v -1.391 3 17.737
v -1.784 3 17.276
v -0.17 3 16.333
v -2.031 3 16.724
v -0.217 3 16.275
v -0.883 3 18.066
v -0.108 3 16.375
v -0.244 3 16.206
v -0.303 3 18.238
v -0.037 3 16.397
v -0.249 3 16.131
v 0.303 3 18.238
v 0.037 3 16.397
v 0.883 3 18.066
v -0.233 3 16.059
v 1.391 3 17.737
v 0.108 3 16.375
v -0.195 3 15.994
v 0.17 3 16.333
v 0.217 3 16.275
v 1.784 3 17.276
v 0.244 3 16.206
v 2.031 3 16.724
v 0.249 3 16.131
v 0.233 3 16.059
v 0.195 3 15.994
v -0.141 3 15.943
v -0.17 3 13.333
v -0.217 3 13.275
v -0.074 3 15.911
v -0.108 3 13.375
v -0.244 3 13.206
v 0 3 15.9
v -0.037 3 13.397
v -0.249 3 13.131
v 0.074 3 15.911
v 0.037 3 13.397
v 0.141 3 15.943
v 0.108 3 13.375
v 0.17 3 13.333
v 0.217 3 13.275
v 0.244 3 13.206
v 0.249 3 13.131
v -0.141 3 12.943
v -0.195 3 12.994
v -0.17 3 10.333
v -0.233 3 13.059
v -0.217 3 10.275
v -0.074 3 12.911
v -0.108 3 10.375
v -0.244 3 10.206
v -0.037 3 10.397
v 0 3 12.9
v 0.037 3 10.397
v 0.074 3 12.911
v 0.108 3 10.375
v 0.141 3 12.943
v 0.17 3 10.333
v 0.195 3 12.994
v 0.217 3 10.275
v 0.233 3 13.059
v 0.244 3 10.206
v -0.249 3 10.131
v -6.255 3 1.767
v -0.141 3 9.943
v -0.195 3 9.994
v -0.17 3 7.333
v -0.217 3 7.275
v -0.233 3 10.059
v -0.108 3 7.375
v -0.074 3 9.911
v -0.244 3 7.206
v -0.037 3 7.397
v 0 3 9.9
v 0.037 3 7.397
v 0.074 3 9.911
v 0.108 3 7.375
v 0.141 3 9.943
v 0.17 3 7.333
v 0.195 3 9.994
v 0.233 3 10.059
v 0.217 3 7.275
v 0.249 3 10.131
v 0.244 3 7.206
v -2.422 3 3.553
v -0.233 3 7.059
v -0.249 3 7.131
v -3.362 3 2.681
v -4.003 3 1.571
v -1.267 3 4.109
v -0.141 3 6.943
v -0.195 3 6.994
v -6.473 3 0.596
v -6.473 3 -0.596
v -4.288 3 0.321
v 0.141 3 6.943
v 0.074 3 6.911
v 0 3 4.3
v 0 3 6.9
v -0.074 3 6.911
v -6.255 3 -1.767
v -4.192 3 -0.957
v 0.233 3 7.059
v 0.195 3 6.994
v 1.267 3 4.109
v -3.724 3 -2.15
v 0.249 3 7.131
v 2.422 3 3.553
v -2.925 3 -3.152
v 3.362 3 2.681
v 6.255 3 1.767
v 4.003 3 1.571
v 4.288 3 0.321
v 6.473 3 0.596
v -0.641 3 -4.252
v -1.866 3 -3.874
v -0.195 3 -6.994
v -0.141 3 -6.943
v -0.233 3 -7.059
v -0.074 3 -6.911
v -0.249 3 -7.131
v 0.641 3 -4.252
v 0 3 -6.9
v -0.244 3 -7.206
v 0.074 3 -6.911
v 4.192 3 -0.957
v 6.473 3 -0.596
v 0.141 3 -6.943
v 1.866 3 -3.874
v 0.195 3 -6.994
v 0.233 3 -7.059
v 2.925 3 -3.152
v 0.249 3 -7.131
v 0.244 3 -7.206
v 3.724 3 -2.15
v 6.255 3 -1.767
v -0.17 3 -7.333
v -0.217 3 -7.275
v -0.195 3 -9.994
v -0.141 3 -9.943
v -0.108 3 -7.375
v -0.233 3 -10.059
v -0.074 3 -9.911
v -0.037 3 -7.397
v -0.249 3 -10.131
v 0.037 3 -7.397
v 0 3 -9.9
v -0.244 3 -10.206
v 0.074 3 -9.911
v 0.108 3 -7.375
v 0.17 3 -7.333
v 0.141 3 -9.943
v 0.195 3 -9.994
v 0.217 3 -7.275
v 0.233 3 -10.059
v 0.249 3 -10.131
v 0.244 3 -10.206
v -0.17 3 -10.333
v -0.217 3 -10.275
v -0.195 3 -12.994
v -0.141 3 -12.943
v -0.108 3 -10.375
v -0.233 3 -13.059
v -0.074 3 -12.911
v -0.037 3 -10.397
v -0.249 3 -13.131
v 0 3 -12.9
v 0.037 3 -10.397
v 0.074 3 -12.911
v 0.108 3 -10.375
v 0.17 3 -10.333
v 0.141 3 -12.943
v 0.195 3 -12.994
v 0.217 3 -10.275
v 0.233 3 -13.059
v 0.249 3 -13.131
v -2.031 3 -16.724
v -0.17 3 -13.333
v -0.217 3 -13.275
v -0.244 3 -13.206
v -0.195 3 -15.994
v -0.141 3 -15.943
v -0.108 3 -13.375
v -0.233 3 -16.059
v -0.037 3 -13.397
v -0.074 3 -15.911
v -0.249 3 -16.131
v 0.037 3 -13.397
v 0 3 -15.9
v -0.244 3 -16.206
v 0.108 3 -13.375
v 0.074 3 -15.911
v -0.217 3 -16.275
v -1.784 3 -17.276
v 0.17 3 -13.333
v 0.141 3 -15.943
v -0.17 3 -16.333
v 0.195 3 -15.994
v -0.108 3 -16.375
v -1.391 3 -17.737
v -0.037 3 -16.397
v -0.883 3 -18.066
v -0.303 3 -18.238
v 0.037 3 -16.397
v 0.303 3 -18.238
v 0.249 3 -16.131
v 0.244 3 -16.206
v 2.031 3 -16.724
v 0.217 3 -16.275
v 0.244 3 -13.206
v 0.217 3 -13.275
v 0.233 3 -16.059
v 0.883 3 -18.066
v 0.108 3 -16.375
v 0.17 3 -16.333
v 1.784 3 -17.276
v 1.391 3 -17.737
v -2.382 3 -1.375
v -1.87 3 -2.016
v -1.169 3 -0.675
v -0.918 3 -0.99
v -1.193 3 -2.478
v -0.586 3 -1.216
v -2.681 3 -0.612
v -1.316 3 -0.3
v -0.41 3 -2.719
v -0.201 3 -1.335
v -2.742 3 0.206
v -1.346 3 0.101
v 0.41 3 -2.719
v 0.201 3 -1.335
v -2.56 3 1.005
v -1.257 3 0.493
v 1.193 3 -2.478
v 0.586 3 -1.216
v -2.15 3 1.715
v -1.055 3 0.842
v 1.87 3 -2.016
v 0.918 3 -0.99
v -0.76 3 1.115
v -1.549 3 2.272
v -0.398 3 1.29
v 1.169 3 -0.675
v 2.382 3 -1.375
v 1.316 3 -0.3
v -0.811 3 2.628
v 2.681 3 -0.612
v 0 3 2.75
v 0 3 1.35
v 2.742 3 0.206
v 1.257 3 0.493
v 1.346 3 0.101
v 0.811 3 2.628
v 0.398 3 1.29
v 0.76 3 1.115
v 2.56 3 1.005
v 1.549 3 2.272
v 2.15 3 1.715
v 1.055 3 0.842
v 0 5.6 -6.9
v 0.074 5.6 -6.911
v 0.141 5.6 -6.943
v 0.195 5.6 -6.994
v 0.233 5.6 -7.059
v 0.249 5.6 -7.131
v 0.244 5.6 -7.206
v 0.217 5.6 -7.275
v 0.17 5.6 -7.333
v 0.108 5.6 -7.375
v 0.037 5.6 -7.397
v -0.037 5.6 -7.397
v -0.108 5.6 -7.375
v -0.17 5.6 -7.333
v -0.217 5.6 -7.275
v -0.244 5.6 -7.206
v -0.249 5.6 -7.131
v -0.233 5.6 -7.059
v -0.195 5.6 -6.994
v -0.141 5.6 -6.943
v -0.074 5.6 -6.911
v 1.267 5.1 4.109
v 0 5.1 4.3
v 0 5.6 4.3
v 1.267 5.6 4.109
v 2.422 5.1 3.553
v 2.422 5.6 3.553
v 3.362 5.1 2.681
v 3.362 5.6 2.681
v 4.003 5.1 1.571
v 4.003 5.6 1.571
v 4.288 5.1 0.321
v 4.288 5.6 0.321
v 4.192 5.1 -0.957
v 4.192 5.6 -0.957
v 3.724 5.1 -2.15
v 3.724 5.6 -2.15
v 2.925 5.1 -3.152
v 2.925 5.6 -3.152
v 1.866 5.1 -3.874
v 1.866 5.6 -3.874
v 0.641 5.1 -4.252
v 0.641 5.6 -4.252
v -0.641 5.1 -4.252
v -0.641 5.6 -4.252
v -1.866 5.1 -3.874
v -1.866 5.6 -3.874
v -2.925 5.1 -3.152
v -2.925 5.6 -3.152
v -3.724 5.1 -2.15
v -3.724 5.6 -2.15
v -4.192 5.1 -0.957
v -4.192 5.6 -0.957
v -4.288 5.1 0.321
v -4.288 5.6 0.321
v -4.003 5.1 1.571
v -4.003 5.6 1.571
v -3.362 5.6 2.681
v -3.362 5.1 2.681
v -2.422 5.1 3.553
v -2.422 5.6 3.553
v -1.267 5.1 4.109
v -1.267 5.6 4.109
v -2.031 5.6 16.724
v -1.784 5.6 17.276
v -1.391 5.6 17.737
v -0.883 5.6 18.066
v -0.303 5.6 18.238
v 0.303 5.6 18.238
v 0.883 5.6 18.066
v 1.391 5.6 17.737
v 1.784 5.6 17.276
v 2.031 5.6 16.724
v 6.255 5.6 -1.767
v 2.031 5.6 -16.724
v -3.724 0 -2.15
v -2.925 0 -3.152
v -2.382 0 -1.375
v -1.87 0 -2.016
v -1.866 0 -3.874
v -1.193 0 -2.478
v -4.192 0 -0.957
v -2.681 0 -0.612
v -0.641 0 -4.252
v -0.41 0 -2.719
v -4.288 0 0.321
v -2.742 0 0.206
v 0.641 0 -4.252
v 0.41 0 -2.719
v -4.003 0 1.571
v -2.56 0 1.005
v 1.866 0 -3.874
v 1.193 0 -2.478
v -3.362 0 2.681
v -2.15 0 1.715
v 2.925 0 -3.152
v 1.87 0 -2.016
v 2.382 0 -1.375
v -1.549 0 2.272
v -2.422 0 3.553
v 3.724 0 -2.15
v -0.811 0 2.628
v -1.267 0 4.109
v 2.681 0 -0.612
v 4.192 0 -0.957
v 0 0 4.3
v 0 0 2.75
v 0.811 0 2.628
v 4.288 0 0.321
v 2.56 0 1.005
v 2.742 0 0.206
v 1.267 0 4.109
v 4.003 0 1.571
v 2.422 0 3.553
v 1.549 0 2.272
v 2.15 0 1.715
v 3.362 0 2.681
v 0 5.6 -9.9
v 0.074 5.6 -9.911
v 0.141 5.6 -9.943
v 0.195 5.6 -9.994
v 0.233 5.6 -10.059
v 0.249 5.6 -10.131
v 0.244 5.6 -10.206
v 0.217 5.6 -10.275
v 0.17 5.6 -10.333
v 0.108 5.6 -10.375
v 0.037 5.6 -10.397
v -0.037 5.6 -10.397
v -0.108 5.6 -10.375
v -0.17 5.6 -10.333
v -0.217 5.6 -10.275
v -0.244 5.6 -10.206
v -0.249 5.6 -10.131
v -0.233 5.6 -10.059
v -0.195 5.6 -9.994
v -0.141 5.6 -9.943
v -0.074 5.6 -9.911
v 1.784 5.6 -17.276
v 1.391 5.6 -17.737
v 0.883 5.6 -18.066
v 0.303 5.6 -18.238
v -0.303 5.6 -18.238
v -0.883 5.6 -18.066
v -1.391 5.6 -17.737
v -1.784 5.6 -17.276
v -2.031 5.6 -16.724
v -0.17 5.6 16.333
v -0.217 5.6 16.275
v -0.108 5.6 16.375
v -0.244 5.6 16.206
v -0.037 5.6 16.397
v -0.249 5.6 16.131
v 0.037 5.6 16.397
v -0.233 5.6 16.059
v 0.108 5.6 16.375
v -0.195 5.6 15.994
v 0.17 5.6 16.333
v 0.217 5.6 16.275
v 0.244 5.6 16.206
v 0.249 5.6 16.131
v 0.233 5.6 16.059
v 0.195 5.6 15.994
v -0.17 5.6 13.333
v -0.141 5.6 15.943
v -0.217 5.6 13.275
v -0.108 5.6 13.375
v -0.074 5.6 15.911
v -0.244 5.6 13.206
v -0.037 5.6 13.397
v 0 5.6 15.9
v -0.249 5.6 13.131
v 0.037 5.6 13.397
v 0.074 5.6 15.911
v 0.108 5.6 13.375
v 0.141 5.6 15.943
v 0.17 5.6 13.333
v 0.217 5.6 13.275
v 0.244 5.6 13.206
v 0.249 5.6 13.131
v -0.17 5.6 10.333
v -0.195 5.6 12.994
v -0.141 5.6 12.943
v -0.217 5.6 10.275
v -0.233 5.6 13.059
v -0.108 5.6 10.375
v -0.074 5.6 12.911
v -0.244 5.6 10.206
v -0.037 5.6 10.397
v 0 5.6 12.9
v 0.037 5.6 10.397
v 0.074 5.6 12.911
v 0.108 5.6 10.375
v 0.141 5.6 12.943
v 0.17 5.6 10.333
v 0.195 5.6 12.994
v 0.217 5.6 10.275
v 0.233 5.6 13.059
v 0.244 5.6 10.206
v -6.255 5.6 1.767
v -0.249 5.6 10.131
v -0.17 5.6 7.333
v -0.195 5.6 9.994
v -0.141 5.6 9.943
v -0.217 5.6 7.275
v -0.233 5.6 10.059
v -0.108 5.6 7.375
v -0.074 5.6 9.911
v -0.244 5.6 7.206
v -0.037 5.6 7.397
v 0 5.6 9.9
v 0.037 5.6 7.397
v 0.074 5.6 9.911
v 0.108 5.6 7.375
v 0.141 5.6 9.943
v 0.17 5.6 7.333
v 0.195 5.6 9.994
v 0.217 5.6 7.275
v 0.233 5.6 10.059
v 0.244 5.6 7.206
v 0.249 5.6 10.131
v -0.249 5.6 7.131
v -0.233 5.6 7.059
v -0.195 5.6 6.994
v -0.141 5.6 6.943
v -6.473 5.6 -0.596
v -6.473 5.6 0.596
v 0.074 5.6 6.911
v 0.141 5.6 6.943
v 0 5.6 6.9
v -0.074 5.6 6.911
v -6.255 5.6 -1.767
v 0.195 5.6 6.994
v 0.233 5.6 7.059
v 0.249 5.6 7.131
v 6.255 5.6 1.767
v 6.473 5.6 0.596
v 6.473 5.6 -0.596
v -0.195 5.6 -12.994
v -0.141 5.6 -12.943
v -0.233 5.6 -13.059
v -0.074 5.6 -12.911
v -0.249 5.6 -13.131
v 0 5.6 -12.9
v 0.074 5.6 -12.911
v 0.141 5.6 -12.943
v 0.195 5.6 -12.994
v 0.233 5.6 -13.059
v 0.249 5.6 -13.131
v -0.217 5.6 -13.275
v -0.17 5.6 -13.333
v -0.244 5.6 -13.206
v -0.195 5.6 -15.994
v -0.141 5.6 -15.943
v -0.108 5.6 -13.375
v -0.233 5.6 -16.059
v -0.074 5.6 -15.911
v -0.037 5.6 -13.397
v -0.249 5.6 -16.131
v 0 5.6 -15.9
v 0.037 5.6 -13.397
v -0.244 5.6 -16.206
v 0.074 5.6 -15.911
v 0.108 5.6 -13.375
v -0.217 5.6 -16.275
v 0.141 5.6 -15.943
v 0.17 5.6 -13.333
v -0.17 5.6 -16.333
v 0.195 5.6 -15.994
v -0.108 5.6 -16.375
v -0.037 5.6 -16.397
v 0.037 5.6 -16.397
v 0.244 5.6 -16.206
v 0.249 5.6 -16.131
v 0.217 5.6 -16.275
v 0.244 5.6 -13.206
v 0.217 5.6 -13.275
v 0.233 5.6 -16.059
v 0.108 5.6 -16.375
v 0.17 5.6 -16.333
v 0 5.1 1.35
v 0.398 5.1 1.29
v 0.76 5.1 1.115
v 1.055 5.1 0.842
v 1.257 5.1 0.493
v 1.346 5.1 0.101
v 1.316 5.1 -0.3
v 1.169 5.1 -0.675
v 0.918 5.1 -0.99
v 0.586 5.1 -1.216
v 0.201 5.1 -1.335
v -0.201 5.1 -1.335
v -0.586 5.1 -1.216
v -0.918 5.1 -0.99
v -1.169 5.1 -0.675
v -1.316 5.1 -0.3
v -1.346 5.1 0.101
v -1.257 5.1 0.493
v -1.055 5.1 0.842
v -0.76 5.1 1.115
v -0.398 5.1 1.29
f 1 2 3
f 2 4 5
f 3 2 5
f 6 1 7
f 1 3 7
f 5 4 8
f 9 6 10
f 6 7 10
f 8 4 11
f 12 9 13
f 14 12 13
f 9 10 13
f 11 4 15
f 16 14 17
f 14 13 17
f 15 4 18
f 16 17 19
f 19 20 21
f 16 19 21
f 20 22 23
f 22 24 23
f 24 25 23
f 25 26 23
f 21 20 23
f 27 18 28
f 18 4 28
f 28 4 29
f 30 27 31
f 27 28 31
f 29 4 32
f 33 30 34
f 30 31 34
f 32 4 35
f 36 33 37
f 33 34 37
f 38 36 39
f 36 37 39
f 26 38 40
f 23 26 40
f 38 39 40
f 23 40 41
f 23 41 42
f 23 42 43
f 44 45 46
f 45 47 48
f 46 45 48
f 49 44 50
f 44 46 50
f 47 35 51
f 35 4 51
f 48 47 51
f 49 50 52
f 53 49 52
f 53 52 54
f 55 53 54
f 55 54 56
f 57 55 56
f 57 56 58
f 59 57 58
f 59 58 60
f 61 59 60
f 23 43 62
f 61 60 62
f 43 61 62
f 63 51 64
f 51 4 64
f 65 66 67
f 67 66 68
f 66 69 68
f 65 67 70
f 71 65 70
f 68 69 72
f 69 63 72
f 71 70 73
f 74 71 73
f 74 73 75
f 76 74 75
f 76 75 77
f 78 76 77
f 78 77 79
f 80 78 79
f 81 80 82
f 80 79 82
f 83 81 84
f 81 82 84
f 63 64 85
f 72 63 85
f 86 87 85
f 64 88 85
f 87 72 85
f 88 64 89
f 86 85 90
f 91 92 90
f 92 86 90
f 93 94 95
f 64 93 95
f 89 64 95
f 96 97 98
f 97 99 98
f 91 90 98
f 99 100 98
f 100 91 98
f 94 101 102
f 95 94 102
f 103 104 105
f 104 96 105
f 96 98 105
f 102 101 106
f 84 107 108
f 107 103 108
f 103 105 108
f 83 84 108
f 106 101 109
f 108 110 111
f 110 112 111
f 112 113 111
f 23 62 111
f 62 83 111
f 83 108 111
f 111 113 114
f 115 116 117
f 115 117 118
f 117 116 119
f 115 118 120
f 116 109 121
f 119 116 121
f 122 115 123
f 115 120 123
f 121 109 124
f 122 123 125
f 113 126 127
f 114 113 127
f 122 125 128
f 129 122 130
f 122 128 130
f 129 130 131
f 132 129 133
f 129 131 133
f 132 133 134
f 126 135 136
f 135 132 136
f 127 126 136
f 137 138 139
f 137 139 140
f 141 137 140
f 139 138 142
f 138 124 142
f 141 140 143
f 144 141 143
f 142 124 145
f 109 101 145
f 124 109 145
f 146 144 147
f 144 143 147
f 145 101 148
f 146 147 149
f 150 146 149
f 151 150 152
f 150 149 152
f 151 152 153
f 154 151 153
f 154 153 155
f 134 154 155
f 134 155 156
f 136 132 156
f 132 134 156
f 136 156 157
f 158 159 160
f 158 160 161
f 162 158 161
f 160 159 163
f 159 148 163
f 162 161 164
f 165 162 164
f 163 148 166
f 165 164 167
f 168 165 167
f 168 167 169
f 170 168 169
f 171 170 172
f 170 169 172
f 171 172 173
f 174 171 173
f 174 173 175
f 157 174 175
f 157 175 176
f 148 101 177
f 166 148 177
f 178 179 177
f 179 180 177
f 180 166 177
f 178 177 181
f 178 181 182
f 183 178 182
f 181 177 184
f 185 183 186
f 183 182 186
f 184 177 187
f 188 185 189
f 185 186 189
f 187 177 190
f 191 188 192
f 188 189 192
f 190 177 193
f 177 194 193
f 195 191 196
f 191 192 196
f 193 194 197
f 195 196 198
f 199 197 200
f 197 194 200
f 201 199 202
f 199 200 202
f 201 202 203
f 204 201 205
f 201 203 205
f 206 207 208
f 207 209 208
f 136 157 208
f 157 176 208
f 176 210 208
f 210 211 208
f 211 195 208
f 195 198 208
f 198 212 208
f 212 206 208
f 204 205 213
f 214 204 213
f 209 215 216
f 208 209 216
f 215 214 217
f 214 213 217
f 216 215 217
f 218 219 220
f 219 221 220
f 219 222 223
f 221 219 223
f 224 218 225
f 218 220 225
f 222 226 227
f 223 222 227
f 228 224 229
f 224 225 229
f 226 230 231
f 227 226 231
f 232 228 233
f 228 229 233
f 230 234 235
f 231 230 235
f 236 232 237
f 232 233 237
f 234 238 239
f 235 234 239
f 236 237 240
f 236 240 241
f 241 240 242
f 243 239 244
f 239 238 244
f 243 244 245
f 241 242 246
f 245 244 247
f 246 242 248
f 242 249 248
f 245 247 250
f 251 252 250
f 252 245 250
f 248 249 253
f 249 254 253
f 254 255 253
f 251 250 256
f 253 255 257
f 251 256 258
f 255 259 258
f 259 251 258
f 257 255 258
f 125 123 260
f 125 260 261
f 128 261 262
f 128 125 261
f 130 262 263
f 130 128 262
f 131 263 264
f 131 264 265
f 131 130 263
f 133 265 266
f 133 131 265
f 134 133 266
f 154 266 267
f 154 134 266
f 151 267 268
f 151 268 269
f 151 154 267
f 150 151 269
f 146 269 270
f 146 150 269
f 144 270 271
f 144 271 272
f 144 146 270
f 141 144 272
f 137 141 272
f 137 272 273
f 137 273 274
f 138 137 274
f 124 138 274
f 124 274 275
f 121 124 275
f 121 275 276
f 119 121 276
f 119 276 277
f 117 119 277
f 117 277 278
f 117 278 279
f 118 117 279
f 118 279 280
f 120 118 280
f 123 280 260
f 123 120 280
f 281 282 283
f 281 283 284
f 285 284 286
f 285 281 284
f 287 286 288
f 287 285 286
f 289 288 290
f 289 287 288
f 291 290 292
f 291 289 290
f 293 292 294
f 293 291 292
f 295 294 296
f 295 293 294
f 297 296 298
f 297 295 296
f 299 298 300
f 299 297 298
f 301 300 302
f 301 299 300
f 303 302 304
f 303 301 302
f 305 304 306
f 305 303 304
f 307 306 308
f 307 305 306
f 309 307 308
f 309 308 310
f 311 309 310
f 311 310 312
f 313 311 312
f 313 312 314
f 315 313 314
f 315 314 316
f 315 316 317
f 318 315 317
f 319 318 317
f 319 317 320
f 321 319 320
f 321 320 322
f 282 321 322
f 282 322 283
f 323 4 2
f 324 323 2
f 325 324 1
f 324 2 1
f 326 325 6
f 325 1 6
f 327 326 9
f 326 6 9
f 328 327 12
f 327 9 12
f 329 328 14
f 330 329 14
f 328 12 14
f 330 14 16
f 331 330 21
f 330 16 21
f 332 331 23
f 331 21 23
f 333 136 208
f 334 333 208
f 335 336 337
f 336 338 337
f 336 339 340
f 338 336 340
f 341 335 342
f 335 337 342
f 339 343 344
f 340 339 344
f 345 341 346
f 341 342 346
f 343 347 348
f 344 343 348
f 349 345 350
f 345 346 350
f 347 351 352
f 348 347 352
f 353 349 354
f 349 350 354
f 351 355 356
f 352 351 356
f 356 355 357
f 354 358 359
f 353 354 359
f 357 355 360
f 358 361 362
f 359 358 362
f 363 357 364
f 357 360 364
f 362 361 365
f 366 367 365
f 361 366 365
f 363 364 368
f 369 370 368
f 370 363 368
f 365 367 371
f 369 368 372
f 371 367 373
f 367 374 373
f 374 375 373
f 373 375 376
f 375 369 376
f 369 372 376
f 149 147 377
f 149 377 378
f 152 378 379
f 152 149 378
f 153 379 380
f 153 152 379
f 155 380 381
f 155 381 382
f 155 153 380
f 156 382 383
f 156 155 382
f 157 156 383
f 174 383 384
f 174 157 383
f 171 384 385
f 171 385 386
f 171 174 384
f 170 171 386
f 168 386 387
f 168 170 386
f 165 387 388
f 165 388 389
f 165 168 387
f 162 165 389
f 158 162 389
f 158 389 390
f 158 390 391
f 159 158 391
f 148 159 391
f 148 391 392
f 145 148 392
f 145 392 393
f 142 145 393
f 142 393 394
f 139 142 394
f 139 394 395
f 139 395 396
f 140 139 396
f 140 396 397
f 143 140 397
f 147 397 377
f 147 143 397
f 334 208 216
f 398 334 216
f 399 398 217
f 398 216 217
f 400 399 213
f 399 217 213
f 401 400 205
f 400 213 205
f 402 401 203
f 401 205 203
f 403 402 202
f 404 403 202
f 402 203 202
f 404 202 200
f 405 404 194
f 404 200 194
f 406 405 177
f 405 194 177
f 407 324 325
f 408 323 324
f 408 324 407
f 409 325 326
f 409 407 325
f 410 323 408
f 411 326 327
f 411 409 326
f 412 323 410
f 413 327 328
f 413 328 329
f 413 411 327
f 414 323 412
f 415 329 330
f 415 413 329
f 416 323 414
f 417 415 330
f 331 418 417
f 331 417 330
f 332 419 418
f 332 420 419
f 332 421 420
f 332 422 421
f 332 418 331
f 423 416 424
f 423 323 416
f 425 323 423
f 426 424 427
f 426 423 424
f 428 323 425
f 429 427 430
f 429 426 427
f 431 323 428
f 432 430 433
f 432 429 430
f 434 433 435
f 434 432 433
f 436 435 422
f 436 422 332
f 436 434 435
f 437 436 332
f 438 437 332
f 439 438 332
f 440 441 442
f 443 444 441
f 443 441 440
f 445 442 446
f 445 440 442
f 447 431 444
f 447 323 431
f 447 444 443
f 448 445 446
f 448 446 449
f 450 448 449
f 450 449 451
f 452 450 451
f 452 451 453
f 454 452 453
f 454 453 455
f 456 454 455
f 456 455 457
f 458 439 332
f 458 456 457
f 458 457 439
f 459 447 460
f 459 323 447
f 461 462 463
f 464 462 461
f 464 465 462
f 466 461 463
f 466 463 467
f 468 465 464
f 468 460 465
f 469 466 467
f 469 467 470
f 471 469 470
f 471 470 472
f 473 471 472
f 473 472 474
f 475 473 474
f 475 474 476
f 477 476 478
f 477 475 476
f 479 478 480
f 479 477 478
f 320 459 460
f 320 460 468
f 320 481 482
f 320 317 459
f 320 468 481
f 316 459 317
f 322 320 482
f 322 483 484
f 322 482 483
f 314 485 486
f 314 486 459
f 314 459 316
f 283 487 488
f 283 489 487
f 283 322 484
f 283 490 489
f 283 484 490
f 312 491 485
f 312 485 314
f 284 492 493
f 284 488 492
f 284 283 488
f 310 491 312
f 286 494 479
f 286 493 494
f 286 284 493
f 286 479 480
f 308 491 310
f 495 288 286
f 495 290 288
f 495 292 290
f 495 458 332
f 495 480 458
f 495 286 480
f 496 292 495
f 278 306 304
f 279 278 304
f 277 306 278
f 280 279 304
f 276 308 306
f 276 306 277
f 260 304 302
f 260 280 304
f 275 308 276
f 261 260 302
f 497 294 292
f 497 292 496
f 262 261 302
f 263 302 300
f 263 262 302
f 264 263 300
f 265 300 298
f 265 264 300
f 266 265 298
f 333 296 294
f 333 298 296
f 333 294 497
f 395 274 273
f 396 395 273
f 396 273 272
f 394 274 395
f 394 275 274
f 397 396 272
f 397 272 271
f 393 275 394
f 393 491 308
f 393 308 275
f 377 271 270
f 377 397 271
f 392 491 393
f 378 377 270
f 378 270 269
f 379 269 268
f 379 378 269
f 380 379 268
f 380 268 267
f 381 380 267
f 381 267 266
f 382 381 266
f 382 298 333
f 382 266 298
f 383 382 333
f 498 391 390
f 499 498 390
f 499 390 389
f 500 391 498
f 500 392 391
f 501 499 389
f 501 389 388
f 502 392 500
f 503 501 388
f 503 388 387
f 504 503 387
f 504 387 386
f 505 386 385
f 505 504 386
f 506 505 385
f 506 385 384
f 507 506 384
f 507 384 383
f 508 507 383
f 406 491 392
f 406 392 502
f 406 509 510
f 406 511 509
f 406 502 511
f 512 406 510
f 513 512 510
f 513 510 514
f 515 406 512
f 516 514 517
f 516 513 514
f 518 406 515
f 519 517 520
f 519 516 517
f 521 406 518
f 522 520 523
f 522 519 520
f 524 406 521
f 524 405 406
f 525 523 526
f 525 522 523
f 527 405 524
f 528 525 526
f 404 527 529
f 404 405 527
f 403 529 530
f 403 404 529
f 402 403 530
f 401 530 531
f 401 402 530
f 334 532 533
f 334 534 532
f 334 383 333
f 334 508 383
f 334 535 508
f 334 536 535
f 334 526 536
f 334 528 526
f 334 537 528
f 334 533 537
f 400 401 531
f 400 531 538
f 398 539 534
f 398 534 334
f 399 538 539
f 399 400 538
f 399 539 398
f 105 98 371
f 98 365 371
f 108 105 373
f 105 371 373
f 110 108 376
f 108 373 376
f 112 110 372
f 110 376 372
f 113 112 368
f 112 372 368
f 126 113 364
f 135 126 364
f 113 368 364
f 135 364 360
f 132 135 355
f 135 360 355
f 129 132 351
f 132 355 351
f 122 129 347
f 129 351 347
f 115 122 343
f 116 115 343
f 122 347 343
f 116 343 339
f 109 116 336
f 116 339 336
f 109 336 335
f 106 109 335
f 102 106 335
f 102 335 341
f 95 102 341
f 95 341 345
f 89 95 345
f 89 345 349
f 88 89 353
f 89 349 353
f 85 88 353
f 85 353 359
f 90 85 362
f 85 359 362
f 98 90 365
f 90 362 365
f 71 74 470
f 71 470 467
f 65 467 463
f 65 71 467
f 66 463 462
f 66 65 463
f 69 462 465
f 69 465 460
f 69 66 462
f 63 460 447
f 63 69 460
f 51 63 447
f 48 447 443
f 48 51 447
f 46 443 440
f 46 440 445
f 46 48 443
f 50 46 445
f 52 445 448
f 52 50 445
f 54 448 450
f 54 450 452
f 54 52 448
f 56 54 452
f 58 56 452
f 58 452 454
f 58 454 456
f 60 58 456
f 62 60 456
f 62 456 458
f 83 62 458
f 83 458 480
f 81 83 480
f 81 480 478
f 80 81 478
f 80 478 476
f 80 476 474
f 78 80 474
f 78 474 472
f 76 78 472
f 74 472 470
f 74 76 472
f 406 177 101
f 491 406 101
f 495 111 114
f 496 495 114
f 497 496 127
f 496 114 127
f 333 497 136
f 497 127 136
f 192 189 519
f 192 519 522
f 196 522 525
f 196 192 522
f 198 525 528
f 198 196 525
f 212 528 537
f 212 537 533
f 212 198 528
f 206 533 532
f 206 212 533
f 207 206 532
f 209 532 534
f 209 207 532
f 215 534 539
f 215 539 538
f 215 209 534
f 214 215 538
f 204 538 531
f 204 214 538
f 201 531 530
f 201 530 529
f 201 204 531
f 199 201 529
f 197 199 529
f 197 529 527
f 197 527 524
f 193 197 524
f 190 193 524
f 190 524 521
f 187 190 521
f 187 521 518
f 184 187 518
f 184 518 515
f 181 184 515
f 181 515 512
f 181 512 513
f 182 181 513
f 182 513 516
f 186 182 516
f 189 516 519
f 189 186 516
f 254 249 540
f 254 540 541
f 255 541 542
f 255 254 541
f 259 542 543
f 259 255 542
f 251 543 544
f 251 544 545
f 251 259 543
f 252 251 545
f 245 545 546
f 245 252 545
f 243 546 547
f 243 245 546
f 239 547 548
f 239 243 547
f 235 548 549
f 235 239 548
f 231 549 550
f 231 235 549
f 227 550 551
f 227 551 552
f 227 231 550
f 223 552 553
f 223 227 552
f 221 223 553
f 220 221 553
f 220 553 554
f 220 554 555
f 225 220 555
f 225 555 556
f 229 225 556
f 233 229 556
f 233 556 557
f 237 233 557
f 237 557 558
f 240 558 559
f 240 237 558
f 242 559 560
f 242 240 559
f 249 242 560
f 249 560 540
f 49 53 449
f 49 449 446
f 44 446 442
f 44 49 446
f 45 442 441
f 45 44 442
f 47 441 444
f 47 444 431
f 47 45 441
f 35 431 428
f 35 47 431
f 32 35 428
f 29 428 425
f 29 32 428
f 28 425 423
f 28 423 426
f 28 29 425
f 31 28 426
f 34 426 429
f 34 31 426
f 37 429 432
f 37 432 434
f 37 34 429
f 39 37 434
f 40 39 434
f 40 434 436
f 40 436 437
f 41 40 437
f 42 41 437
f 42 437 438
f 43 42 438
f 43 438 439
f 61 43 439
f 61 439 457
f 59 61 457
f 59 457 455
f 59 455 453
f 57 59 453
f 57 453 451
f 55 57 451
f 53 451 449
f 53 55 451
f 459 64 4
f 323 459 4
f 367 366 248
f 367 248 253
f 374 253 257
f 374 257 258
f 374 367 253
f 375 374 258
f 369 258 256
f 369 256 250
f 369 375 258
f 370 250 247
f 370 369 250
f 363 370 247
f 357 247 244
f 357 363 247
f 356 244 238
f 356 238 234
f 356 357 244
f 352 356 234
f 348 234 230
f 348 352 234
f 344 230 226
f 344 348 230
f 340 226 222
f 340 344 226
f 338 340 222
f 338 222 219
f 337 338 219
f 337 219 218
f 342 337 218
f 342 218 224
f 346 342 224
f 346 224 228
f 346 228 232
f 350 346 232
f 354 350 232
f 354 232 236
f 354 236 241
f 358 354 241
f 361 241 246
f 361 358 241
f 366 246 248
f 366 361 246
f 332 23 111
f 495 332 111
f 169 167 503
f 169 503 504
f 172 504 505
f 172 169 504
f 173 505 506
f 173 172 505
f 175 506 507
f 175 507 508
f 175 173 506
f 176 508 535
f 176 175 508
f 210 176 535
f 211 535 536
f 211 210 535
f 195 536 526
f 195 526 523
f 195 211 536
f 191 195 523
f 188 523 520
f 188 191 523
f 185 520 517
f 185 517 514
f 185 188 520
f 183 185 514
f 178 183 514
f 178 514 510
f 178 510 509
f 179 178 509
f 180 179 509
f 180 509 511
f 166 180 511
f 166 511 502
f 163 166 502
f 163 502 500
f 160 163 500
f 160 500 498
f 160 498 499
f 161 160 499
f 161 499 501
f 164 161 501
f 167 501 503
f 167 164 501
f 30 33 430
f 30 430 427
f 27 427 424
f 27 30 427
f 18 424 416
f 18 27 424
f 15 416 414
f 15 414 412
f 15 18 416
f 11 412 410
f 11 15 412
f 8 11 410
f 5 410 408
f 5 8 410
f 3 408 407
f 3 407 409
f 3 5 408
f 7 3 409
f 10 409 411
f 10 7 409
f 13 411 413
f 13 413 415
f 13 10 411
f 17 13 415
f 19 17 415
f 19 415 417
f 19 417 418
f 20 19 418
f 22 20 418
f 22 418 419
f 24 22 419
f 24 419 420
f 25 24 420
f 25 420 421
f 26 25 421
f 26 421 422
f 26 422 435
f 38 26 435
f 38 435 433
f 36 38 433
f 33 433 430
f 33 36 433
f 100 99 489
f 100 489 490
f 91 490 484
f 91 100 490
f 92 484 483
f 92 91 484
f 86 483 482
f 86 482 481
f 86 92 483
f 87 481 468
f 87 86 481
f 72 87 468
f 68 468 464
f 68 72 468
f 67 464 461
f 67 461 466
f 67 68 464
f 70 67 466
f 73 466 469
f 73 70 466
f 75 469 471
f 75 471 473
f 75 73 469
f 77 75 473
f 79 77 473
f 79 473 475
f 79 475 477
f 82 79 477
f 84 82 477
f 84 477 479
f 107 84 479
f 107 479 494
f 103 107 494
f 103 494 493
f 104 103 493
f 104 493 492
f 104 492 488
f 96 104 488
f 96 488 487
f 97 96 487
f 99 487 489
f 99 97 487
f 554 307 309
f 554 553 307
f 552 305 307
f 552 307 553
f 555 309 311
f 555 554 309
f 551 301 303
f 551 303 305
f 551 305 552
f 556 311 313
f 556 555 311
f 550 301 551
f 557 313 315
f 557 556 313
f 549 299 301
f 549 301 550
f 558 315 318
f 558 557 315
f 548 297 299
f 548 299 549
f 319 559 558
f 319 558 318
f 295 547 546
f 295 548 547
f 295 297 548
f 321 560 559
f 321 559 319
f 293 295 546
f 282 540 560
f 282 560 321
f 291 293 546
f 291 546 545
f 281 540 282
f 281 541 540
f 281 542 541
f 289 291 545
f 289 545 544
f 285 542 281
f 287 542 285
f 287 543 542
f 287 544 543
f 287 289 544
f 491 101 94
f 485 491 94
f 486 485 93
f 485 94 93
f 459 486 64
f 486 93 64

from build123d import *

# Parameters (mm, degrees)
SKETCH2_R                = 4.3
SKETCH2_R_2              = 2.75
BOSS_EXTRUDE1_DEPTH      = 3
SKETCH3_R                = 4.3
SKETCH3_R_2              = 1.35
BOSS_EXTRUDE2_DEPTH      = 2.1
BOSS_EXTRUDE3_DEPTH      = 0.5
BOSS_EXTRUDE3_DEPTH_BACK = 2.1
SKETCH4_R                = 4.3
SKETCH4_R_2              = 0.25


with BuildPart() as part:
    # Sketch2 → Boss-Extrude1 (new body)
    with BuildSketch(Plane(origin=(0, 0, 0), x_dir=(1, 0, 0), z_dir=(0, 1, 0))):
        with Locations(Location((0, 0, 0), (0, 0, 270))):
            Circle(SKETCH2_R)
        with Locations(Location((0, 0, 0), (0, 0, 270))):
            Circle(SKETCH2_R_2, mode=Mode.SUBTRACT)
    extrude(amount=BOSS_EXTRUDE1_DEPTH)



with BuildPart() as body_2:
    # Sketch3 → Boss-Extrude2 (new body)
    with BuildSketch(Plane(origin=(0, 3, 0), x_dir=(1, 0, 0), z_dir=(0, 1, 0))):
        with Locations(Location((0, 0, 0), (0, 0, 270))):
            Circle(SKETCH3_R)
        with Locations(Location((0, 0, 0), (0, 0, 270))):
            Circle(SKETCH3_R_2, mode=Mode.SUBTRACT)
    extrude(amount=BOSS_EXTRUDE2_DEPTH)


with BuildPart() as part_1:
    add(part.part)

    add(body_2.part)  # Boss-Extrude3 merges body 2
    # Sketch4 → Boss-Extrude3 (add, two sides: drawn at the far end of the back side and taken through both)
    with BuildSketch(Plane(origin=(0, 5.1, 0), x_dir=(1, 0, 0), z_dir=(0, 1, 0)).offset(-BOSS_EXTRUDE3_DEPTH_BACK)):
        with BuildLine():
            Line((-2.030550566, 16.72355418), (-6.25525056, 1.766873065))
            ThreePointArc((-6.25525056, 1.766873065), (-6.5, 0), (-6.25525056, -1.766873065))
            Line((-6.25525056, -1.766873065), (-2.030550566, -16.72355418))
            ThreePointArc((-2.030550566, -16.72355418), (0, -18.26), (2.030550566, -16.72355418))
            Line((2.030550566, -16.72355418), (6.25525056, -1.766873065))
            ThreePointArc((6.25525056, -1.766873065), (6.5, 0), (6.25525056, 1.766873065))
            Line((6.25525056, 1.766873065), (2.030550566, 16.72355418))
            ThreePointArc((2.030550566, 16.72355418), (0, 18.26), (-2.030550566, 16.72355418))
        make_face()
        with Locations(Location((0, 0, 0), (0, 0, 270))):
            Circle(SKETCH4_R, mode=Mode.SUBTRACT)
        with Locations(Location((0, 16.15, 0), (0, 0, 270))):
            Circle(SKETCH4_R_2, mode=Mode.SUBTRACT)
        with Locations(Location((0, 13.15, 0), (0, 0, 270))):
            Circle(SKETCH4_R_2, mode=Mode.SUBTRACT)
        with Locations(Location((0, 10.15, 0), (0, 0, 270))):
            Circle(SKETCH4_R_2, mode=Mode.SUBTRACT)
        with Locations(Location((0, 7.15, 0), (0, 0, 270))):
            Circle(SKETCH4_R_2, mode=Mode.SUBTRACT)
        with Locations(Location((0, -7.15, 0), (0, 0, 90))):
            Circle(SKETCH4_R_2, mode=Mode.SUBTRACT)
        with Locations(Location((0, -10.15, 0), (0, 0, 90))):
            Circle(SKETCH4_R_2, mode=Mode.SUBTRACT)
        with Locations(Location((0, -13.15, 0), (0, 0, 90))):
            Circle(SKETCH4_R_2, mode=Mode.SUBTRACT)
        with Locations(Location((0, -16.15, 0), (0, 0, 90))):
            Circle(SKETCH4_R_2, mode=Mode.SUBTRACT)
    extrude(amount=BOSS_EXTRUDE3_DEPTH + BOSS_EXTRUDE3_DEPTH_BACK)


solid = part_1.part
